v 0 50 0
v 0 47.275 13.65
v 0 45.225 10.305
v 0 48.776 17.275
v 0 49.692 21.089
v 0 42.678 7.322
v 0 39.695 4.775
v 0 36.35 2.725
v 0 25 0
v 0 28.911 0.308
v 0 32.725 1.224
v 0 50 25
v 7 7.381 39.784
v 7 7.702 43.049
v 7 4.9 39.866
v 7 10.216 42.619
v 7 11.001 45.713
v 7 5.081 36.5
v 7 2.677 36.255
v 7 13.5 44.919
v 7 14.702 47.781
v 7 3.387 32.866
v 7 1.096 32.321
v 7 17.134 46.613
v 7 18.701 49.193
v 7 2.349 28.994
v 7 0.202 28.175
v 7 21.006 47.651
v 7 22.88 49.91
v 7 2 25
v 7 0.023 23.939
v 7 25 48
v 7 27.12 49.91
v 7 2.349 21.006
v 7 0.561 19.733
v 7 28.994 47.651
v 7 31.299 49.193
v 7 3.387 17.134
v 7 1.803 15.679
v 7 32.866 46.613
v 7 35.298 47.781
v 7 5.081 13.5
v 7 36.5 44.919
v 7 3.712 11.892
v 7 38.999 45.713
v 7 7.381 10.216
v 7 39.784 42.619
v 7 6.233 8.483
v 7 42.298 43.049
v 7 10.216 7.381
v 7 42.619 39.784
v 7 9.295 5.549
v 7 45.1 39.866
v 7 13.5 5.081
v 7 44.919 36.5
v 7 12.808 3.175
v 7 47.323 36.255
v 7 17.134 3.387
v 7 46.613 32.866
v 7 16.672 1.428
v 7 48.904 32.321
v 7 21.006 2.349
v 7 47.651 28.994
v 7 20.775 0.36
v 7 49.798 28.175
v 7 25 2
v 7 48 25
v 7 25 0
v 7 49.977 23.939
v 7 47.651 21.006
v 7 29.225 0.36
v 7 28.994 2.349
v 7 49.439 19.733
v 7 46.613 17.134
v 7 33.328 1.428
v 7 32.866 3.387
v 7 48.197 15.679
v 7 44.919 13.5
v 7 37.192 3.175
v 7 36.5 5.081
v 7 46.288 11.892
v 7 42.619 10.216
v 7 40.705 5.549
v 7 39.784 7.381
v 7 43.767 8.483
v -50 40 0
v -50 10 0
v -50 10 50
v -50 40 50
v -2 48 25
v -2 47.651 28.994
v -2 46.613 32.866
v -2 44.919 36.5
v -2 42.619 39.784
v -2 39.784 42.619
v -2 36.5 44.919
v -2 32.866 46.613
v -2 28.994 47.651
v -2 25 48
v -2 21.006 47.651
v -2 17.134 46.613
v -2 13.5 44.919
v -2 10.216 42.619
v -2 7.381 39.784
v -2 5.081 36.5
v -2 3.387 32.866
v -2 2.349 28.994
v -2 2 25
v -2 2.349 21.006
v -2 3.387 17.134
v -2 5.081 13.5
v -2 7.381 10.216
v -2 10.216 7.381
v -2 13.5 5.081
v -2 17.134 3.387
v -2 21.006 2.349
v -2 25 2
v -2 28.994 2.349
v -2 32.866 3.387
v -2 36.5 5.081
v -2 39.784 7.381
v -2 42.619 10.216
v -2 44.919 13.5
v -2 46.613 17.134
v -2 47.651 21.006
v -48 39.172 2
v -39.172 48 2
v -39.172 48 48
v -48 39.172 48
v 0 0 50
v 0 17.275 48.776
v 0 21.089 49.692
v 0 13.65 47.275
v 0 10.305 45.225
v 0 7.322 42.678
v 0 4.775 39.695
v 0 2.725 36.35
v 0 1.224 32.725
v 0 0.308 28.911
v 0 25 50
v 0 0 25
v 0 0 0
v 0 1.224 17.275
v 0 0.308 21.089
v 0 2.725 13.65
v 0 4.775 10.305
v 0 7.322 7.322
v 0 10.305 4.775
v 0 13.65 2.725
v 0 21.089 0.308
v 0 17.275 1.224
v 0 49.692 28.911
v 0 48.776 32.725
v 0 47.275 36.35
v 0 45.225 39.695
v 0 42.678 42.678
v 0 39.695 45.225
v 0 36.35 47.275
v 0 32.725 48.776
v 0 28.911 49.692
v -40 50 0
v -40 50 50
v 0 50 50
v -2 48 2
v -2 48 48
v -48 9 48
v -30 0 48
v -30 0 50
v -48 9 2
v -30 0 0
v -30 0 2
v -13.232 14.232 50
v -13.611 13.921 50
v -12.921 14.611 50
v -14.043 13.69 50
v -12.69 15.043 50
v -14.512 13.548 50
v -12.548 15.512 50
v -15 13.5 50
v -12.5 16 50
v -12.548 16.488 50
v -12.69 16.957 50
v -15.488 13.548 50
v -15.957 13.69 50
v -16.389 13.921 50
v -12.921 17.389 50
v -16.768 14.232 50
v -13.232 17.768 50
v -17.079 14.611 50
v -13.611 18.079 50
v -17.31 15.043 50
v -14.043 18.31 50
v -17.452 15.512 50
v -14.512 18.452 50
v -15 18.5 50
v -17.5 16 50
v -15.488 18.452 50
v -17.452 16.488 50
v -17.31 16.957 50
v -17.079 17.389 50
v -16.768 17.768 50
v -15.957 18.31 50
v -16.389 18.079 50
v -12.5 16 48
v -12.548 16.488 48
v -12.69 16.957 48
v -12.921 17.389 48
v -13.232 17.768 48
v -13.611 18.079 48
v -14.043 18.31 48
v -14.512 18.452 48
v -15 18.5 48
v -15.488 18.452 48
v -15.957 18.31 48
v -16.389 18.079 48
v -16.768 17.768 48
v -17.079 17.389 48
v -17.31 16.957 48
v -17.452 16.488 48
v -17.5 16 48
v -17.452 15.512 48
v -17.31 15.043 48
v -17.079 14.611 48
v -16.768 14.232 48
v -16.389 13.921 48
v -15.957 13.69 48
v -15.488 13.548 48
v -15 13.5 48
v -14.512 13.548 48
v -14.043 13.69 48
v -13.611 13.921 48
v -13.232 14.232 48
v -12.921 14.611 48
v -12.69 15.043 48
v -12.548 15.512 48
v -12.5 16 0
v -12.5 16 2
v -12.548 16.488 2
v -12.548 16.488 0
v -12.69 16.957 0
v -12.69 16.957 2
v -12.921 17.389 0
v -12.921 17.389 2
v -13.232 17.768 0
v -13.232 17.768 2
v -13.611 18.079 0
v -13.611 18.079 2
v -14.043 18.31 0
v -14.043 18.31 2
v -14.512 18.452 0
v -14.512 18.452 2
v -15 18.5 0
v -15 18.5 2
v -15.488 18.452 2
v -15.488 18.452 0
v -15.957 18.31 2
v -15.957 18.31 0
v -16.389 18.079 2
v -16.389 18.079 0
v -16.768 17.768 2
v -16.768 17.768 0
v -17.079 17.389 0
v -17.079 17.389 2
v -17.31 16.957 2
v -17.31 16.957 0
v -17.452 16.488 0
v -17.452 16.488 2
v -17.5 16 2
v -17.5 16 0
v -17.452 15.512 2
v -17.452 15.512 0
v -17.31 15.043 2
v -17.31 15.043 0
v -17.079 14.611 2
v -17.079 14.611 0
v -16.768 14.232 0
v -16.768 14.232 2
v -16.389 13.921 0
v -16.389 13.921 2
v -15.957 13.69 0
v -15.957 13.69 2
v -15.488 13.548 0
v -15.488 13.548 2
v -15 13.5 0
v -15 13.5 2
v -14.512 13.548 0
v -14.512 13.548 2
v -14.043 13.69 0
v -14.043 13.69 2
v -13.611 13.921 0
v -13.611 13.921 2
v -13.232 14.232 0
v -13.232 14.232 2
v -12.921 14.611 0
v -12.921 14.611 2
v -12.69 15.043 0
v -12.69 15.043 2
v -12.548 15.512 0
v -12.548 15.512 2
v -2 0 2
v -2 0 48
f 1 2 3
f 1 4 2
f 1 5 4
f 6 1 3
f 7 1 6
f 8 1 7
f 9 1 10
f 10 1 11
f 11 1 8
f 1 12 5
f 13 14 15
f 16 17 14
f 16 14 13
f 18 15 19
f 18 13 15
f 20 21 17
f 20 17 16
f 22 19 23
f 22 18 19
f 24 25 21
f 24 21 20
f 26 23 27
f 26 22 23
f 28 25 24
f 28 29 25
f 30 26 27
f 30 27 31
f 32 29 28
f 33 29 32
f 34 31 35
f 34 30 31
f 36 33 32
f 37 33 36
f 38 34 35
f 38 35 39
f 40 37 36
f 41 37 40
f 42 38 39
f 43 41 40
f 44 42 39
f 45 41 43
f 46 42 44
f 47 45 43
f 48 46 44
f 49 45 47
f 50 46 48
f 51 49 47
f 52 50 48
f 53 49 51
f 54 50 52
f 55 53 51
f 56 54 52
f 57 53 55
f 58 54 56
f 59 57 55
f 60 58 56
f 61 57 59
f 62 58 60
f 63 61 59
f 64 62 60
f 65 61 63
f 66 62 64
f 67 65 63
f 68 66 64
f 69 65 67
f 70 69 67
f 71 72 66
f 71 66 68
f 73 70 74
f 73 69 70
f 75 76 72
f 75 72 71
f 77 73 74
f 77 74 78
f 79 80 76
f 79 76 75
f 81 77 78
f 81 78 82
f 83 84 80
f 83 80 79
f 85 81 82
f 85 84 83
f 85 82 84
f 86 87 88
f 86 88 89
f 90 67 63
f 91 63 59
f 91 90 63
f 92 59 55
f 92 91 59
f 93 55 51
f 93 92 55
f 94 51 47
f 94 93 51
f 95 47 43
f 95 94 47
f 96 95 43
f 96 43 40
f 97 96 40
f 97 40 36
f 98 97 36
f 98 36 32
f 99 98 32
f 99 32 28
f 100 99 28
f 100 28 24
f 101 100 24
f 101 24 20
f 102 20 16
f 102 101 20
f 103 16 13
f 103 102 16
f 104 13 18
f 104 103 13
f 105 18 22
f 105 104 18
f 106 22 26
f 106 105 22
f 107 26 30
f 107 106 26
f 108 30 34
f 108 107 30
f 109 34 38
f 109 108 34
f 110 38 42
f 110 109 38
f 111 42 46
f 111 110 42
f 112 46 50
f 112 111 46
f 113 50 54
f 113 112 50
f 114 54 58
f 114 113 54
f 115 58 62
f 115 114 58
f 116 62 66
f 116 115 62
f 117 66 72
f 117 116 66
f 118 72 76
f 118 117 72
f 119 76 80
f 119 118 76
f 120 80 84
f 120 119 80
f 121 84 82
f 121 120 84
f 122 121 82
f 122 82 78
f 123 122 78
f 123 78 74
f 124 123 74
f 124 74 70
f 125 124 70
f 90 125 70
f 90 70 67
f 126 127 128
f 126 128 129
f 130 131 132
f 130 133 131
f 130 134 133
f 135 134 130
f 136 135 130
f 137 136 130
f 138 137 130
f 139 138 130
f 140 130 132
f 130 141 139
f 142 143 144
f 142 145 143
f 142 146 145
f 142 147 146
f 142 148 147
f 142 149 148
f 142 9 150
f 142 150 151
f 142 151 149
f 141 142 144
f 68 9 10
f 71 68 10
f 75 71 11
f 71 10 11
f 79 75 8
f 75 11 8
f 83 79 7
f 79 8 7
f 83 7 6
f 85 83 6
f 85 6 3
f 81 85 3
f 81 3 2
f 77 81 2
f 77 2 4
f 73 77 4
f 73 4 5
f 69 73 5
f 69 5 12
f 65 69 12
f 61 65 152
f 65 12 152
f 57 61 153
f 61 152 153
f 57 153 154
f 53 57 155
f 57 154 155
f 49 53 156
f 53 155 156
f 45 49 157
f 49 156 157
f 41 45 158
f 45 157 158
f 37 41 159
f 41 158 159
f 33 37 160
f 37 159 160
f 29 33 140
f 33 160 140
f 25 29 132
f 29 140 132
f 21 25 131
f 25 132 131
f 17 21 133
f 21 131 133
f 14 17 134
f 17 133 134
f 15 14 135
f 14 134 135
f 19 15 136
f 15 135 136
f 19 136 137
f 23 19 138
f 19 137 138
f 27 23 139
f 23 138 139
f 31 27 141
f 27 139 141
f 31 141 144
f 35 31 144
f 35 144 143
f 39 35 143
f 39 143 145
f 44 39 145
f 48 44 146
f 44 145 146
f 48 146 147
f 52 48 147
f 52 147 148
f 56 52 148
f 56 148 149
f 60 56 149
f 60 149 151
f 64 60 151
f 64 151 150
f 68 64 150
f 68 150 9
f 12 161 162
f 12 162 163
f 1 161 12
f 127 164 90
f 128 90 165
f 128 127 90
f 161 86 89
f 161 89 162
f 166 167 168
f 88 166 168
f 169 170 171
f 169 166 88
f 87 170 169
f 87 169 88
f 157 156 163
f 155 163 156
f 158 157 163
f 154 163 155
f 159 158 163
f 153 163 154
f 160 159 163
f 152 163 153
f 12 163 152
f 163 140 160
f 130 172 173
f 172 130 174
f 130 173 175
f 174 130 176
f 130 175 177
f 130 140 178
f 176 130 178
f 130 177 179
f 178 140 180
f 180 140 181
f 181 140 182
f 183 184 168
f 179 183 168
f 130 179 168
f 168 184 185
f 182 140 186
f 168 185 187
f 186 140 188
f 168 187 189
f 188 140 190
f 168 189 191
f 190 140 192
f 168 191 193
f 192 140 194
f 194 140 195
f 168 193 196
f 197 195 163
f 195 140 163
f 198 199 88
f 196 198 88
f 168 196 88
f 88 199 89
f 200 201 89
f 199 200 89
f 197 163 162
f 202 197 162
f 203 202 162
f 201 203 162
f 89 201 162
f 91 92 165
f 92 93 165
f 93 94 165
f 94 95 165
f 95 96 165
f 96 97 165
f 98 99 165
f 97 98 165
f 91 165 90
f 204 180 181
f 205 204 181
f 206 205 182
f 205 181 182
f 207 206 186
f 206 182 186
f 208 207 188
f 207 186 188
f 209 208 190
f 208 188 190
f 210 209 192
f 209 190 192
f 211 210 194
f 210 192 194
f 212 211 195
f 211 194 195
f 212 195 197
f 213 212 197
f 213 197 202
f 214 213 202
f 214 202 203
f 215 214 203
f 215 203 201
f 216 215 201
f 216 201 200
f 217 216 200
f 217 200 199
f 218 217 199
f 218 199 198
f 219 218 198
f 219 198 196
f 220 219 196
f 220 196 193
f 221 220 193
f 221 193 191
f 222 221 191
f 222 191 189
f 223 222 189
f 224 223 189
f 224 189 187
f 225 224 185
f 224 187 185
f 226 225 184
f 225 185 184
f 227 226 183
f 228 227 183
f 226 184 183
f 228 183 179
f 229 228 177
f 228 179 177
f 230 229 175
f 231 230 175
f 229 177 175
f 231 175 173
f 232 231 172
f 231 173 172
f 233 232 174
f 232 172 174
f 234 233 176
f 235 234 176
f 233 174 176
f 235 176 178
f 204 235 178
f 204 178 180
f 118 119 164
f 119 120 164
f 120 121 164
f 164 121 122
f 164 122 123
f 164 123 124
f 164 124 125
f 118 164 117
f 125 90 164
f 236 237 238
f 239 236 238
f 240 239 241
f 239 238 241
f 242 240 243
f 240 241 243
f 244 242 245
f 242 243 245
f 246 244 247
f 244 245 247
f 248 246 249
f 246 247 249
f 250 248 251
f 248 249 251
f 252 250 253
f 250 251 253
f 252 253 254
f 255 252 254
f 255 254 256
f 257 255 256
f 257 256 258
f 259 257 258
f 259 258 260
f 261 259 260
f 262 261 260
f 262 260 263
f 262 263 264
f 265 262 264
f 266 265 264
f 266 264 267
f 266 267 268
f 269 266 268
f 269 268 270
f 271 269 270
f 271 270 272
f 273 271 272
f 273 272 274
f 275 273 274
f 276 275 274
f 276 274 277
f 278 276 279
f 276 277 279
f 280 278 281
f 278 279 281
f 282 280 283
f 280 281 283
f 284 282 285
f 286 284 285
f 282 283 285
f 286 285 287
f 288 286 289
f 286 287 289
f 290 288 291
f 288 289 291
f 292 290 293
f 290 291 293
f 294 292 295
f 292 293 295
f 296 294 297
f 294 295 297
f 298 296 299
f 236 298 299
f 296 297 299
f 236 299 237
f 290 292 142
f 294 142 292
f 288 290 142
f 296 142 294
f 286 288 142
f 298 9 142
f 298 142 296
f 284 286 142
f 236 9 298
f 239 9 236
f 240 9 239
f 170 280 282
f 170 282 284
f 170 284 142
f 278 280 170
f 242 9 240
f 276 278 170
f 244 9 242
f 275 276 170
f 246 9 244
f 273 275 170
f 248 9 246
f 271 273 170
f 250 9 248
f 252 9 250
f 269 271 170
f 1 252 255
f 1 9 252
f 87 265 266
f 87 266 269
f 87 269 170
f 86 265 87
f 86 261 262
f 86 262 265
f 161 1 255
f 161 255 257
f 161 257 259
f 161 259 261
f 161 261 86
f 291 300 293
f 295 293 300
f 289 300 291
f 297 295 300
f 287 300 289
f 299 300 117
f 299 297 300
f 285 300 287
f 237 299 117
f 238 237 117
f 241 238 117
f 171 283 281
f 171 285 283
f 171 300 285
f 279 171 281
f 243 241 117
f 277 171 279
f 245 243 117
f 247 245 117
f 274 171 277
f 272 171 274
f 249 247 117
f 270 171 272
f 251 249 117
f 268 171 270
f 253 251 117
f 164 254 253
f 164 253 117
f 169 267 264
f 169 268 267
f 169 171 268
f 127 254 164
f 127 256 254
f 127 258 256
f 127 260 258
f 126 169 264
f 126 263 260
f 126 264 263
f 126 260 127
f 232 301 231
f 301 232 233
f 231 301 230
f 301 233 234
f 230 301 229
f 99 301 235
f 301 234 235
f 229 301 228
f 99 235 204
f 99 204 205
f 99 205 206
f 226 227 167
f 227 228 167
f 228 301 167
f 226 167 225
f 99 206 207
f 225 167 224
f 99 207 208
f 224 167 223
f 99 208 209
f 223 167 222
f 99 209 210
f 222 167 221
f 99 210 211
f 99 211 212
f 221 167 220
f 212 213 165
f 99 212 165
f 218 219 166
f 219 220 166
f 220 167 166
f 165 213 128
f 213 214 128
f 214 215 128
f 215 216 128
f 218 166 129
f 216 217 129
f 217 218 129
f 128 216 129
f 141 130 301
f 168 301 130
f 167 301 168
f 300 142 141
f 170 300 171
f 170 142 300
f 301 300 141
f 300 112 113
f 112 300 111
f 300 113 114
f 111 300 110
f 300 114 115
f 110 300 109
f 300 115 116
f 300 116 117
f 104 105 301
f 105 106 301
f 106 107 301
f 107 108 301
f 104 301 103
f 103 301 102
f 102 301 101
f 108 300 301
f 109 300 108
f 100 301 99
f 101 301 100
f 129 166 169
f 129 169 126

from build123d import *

# Parameters (mm, degrees)
BOSS_EXTRU_1_DEPTH      = 50
ESQUISSE3_R             = 25
BOSS_EXTRU_2_DEPTH      = 7
ESQUISSE4_R             = 2.5
ENL_V_MAT_EXTRU_1_DEPTH = 87.602540378
COQUE1_START            = -39.171572875
COQUE1_OUTLINE_W        = 48
COQUE1_OUTLINE_H        = 46
COQUE1_DEPTH            = 37.171572875
COQUE1_START_2          = -2
COQUE1_2_OUTLINE_R      = 23
COQUE1_2_DEPTH          = 9
COQUE1_START_3          = -48
COQUE1_3_DEPTH          = 15.9452
COQUE1_START_4          = 2
COQUE1_4_DEPTH          = 46


with BuildPart() as part:
    # Esquisse1 → Boss.-Extru.1 (new body)
    with BuildSketch(Plane.XY):
        Polygon((0, 0), (-30, 0), (-50, 10), (-50, 40), (-40, 50), (0, 50), align=None)
    extrude(amount=BOSS_EXTRU_1_DEPTH)

    # Esquisse3 → Boss.-Extru.2 (add)
    with BuildSketch(Plane(origin=(0, 0, 0), x_dir=(0, 0, -1), z_dir=(1, 0, 0))):
        with Locations((-25, 25)):
            Circle(ESQUISSE3_R)
    extrude(amount=BOSS_EXTRU_2_DEPTH)

    # Esquisse4 → Enlèv. mat.-Extru.1 (cut, through all)
    with BuildSketch(Plane.XY.offset(50)):
        with Locations((-15, 16)):
            Circle(ESQUISSE4_R)
    extrude(amount=-ENL_V_MAT_EXTRU_1_DEPTH, mode=Mode.SUBTRACT)

    # Coque1: read off the stored shape, not the designer's step
    # Coque1 outline → Coque1 (cut)
    with BuildSketch(Plane.YZ.offset(COQUE1_START)):
        with Locations((24, 25)):
            Rectangle(COQUE1_OUTLINE_W, COQUE1_OUTLINE_H)
    extrude(amount=COQUE1_DEPTH, mode=Mode.SUBTRACT)

    # Coque1 2 outline → Coque1 2 (cut)
    with BuildSketch(Plane.YZ.offset(COQUE1_START_2)):
        with Locations((25, 25)):
            Circle(COQUE1_2_OUTLINE_R)
    extrude(amount=COQUE1_2_DEPTH, mode=Mode.SUBTRACT)

    # Coque1 3 outline → Coque1 3 (cut)
    with BuildSketch(Plane.YZ.offset(COQUE1_START_3)):
        with BuildLine():
            ThreePointArc((25, 2), (2, 25), (25, 48))
            Line((25, 48), (0, 48))
            Line((0, 48), (0, 2))
            Line((0, 2), (25, 2))
        make_face()
    extrude(amount=COQUE1_3_DEPTH, mode=Mode.SUBTRACT)

    # Coque1 4 outline → Coque1 4 (cut)
    with BuildSketch(Plane.XY.offset(COQUE1_START_4)):
        Polygon((-39.171572875, 48), (-48, 39.171572875), (-48, 9), (-39.171572875, 4.585786437), align=None)
    extrude(amount=COQUE1_4_DEPTH, mode=Mode.SUBTRACT)


solid = part.part
